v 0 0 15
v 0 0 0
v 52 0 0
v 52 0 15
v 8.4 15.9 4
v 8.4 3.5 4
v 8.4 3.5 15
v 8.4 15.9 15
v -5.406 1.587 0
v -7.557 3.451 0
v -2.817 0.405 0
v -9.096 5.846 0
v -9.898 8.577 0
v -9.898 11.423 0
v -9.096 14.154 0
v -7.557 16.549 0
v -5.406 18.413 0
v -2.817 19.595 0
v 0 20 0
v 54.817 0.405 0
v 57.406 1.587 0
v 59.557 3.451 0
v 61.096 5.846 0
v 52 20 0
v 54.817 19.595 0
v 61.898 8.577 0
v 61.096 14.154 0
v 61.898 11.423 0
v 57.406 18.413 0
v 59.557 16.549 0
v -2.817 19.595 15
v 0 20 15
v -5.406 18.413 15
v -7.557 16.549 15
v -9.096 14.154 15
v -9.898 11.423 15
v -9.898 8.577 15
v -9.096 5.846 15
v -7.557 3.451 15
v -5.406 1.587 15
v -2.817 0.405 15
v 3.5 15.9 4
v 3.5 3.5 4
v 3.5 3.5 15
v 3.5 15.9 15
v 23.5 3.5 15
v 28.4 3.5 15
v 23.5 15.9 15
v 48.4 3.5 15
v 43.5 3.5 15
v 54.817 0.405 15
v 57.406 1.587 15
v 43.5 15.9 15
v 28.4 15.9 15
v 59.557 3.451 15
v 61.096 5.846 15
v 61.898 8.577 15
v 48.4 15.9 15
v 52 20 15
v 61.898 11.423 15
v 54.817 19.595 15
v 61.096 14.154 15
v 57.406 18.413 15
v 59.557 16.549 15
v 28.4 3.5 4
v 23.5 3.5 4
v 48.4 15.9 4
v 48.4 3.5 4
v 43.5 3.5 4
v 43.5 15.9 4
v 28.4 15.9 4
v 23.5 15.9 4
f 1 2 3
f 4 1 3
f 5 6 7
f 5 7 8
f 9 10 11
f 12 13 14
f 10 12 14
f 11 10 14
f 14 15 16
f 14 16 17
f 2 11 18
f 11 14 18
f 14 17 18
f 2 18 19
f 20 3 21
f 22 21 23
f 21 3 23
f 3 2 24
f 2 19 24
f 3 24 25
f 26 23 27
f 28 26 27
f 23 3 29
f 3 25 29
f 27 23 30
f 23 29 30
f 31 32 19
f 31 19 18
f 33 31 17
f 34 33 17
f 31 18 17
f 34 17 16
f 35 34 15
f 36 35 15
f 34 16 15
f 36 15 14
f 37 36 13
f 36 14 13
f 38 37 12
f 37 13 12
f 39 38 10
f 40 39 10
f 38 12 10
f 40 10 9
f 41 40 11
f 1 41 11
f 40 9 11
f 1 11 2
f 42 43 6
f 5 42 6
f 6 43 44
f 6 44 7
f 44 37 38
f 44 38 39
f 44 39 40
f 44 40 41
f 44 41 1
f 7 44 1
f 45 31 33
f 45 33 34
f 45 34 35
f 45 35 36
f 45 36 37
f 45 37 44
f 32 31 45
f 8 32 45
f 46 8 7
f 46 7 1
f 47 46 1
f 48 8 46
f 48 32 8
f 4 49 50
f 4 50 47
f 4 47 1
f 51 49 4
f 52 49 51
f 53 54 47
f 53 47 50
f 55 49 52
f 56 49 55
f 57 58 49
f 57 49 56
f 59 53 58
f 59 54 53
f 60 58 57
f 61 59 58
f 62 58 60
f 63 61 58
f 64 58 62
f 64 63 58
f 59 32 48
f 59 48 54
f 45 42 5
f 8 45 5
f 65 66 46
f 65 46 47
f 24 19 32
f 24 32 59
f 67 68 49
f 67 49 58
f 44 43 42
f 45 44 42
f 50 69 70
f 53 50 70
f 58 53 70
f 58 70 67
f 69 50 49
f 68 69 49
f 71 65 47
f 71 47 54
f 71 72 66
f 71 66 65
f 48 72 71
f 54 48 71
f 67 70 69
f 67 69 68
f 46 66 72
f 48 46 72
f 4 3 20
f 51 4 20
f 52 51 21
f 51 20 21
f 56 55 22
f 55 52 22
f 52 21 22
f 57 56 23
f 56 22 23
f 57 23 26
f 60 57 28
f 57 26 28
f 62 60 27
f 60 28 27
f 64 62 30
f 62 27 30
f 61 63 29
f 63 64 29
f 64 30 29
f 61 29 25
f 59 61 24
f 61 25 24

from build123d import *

# Parameters (mm, degrees)
BOX003_W          = 4.9
BOX003_H          = 12.4
BOX003_DEPTH      = 20
BOX002_W          = 4.9
BOX002_H          = 12.4
BOX002_DEPTH      = 20
BOX001_W          = 4.9
BOX001_H          = 12.4
BOX001_DEPTH      = 20
CYLINDER_R        = 10
CYLINDER_DEPTH    = 15
CYLINDER001_R     = 10
CYLINDER001_DEPTH = 15
BOX_W             = 52
BOX_H             = 20
BOX_DEPTH         = 15


with BuildPart() as slot003:
    # Box003 → Box003 (new body)
    with BuildSketch(Plane(origin=(43.5, 3.5, 4), x_dir=(1, 0, 0), z_dir=(0, 0, 1))):
        with Locations((2.45, 6.2)):
            Rectangle(BOX003_W, BOX003_H)
    extrude(amount=BOX003_DEPTH)


with BuildPart() as slot002:
    # Box002 → Box002 (new body)
    with BuildSketch(Plane(origin=(23.5, 3.5, 4), x_dir=(1, 0, 0), z_dir=(0, 0, 1))):
        with Locations((2.45, 6.2)):
            Rectangle(BOX002_W, BOX002_H)
    extrude(amount=BOX002_DEPTH)


with BuildPart() as slots:
    # Box001 → Box001 (new body)
    with BuildSketch(Plane(origin=(3.5, 3.5, 4), x_dir=(1, 0, 0), z_dir=(0, 0, 1))):
        with Locations((2.45, 6.2)):
            Rectangle(BOX001_W, BOX001_H)
    extrude(amount=BOX001_DEPTH)

    # Fusion: union slot003, slot002
    add(slot003.part)
    add(slot002.part)


with BuildPart() as cilindro:
    # Cylinder → Cylinder (new body)
    with BuildSketch(Plane(origin=(0, 10, 0), x_dir=(1, 0, 0), z_dir=(0, 0, 1))):
        Circle(CYLINDER_R)
    extrude(amount=CYLINDER_DEPTH)


with BuildPart() as cilindro001:
    # Cylinder001 → Cylinder001 (new body)
    with BuildSketch(Plane(origin=(52, 10, 0), x_dir=(1, 0, 0), z_dir=(0, 0, 1))):
        Circle(CYLINDER001_R)
    extrude(amount=CYLINDER001_DEPTH)


with BuildPart() as cut:
    # Box → Box (new body)
    with BuildSketch(Plane.XY):
        with Locations((26, 10)):
            Rectangle(BOX_W, BOX_H)
    extrude(amount=BOX_DEPTH)

    # Fusion001: union Cilindro, Cilindro001
    add(cilindro.part)
    add(cilindro001.part)

    # Cut: cut slots
    add(slots.part, mode=Mode.SUBTRACT)


solid = cut.part
